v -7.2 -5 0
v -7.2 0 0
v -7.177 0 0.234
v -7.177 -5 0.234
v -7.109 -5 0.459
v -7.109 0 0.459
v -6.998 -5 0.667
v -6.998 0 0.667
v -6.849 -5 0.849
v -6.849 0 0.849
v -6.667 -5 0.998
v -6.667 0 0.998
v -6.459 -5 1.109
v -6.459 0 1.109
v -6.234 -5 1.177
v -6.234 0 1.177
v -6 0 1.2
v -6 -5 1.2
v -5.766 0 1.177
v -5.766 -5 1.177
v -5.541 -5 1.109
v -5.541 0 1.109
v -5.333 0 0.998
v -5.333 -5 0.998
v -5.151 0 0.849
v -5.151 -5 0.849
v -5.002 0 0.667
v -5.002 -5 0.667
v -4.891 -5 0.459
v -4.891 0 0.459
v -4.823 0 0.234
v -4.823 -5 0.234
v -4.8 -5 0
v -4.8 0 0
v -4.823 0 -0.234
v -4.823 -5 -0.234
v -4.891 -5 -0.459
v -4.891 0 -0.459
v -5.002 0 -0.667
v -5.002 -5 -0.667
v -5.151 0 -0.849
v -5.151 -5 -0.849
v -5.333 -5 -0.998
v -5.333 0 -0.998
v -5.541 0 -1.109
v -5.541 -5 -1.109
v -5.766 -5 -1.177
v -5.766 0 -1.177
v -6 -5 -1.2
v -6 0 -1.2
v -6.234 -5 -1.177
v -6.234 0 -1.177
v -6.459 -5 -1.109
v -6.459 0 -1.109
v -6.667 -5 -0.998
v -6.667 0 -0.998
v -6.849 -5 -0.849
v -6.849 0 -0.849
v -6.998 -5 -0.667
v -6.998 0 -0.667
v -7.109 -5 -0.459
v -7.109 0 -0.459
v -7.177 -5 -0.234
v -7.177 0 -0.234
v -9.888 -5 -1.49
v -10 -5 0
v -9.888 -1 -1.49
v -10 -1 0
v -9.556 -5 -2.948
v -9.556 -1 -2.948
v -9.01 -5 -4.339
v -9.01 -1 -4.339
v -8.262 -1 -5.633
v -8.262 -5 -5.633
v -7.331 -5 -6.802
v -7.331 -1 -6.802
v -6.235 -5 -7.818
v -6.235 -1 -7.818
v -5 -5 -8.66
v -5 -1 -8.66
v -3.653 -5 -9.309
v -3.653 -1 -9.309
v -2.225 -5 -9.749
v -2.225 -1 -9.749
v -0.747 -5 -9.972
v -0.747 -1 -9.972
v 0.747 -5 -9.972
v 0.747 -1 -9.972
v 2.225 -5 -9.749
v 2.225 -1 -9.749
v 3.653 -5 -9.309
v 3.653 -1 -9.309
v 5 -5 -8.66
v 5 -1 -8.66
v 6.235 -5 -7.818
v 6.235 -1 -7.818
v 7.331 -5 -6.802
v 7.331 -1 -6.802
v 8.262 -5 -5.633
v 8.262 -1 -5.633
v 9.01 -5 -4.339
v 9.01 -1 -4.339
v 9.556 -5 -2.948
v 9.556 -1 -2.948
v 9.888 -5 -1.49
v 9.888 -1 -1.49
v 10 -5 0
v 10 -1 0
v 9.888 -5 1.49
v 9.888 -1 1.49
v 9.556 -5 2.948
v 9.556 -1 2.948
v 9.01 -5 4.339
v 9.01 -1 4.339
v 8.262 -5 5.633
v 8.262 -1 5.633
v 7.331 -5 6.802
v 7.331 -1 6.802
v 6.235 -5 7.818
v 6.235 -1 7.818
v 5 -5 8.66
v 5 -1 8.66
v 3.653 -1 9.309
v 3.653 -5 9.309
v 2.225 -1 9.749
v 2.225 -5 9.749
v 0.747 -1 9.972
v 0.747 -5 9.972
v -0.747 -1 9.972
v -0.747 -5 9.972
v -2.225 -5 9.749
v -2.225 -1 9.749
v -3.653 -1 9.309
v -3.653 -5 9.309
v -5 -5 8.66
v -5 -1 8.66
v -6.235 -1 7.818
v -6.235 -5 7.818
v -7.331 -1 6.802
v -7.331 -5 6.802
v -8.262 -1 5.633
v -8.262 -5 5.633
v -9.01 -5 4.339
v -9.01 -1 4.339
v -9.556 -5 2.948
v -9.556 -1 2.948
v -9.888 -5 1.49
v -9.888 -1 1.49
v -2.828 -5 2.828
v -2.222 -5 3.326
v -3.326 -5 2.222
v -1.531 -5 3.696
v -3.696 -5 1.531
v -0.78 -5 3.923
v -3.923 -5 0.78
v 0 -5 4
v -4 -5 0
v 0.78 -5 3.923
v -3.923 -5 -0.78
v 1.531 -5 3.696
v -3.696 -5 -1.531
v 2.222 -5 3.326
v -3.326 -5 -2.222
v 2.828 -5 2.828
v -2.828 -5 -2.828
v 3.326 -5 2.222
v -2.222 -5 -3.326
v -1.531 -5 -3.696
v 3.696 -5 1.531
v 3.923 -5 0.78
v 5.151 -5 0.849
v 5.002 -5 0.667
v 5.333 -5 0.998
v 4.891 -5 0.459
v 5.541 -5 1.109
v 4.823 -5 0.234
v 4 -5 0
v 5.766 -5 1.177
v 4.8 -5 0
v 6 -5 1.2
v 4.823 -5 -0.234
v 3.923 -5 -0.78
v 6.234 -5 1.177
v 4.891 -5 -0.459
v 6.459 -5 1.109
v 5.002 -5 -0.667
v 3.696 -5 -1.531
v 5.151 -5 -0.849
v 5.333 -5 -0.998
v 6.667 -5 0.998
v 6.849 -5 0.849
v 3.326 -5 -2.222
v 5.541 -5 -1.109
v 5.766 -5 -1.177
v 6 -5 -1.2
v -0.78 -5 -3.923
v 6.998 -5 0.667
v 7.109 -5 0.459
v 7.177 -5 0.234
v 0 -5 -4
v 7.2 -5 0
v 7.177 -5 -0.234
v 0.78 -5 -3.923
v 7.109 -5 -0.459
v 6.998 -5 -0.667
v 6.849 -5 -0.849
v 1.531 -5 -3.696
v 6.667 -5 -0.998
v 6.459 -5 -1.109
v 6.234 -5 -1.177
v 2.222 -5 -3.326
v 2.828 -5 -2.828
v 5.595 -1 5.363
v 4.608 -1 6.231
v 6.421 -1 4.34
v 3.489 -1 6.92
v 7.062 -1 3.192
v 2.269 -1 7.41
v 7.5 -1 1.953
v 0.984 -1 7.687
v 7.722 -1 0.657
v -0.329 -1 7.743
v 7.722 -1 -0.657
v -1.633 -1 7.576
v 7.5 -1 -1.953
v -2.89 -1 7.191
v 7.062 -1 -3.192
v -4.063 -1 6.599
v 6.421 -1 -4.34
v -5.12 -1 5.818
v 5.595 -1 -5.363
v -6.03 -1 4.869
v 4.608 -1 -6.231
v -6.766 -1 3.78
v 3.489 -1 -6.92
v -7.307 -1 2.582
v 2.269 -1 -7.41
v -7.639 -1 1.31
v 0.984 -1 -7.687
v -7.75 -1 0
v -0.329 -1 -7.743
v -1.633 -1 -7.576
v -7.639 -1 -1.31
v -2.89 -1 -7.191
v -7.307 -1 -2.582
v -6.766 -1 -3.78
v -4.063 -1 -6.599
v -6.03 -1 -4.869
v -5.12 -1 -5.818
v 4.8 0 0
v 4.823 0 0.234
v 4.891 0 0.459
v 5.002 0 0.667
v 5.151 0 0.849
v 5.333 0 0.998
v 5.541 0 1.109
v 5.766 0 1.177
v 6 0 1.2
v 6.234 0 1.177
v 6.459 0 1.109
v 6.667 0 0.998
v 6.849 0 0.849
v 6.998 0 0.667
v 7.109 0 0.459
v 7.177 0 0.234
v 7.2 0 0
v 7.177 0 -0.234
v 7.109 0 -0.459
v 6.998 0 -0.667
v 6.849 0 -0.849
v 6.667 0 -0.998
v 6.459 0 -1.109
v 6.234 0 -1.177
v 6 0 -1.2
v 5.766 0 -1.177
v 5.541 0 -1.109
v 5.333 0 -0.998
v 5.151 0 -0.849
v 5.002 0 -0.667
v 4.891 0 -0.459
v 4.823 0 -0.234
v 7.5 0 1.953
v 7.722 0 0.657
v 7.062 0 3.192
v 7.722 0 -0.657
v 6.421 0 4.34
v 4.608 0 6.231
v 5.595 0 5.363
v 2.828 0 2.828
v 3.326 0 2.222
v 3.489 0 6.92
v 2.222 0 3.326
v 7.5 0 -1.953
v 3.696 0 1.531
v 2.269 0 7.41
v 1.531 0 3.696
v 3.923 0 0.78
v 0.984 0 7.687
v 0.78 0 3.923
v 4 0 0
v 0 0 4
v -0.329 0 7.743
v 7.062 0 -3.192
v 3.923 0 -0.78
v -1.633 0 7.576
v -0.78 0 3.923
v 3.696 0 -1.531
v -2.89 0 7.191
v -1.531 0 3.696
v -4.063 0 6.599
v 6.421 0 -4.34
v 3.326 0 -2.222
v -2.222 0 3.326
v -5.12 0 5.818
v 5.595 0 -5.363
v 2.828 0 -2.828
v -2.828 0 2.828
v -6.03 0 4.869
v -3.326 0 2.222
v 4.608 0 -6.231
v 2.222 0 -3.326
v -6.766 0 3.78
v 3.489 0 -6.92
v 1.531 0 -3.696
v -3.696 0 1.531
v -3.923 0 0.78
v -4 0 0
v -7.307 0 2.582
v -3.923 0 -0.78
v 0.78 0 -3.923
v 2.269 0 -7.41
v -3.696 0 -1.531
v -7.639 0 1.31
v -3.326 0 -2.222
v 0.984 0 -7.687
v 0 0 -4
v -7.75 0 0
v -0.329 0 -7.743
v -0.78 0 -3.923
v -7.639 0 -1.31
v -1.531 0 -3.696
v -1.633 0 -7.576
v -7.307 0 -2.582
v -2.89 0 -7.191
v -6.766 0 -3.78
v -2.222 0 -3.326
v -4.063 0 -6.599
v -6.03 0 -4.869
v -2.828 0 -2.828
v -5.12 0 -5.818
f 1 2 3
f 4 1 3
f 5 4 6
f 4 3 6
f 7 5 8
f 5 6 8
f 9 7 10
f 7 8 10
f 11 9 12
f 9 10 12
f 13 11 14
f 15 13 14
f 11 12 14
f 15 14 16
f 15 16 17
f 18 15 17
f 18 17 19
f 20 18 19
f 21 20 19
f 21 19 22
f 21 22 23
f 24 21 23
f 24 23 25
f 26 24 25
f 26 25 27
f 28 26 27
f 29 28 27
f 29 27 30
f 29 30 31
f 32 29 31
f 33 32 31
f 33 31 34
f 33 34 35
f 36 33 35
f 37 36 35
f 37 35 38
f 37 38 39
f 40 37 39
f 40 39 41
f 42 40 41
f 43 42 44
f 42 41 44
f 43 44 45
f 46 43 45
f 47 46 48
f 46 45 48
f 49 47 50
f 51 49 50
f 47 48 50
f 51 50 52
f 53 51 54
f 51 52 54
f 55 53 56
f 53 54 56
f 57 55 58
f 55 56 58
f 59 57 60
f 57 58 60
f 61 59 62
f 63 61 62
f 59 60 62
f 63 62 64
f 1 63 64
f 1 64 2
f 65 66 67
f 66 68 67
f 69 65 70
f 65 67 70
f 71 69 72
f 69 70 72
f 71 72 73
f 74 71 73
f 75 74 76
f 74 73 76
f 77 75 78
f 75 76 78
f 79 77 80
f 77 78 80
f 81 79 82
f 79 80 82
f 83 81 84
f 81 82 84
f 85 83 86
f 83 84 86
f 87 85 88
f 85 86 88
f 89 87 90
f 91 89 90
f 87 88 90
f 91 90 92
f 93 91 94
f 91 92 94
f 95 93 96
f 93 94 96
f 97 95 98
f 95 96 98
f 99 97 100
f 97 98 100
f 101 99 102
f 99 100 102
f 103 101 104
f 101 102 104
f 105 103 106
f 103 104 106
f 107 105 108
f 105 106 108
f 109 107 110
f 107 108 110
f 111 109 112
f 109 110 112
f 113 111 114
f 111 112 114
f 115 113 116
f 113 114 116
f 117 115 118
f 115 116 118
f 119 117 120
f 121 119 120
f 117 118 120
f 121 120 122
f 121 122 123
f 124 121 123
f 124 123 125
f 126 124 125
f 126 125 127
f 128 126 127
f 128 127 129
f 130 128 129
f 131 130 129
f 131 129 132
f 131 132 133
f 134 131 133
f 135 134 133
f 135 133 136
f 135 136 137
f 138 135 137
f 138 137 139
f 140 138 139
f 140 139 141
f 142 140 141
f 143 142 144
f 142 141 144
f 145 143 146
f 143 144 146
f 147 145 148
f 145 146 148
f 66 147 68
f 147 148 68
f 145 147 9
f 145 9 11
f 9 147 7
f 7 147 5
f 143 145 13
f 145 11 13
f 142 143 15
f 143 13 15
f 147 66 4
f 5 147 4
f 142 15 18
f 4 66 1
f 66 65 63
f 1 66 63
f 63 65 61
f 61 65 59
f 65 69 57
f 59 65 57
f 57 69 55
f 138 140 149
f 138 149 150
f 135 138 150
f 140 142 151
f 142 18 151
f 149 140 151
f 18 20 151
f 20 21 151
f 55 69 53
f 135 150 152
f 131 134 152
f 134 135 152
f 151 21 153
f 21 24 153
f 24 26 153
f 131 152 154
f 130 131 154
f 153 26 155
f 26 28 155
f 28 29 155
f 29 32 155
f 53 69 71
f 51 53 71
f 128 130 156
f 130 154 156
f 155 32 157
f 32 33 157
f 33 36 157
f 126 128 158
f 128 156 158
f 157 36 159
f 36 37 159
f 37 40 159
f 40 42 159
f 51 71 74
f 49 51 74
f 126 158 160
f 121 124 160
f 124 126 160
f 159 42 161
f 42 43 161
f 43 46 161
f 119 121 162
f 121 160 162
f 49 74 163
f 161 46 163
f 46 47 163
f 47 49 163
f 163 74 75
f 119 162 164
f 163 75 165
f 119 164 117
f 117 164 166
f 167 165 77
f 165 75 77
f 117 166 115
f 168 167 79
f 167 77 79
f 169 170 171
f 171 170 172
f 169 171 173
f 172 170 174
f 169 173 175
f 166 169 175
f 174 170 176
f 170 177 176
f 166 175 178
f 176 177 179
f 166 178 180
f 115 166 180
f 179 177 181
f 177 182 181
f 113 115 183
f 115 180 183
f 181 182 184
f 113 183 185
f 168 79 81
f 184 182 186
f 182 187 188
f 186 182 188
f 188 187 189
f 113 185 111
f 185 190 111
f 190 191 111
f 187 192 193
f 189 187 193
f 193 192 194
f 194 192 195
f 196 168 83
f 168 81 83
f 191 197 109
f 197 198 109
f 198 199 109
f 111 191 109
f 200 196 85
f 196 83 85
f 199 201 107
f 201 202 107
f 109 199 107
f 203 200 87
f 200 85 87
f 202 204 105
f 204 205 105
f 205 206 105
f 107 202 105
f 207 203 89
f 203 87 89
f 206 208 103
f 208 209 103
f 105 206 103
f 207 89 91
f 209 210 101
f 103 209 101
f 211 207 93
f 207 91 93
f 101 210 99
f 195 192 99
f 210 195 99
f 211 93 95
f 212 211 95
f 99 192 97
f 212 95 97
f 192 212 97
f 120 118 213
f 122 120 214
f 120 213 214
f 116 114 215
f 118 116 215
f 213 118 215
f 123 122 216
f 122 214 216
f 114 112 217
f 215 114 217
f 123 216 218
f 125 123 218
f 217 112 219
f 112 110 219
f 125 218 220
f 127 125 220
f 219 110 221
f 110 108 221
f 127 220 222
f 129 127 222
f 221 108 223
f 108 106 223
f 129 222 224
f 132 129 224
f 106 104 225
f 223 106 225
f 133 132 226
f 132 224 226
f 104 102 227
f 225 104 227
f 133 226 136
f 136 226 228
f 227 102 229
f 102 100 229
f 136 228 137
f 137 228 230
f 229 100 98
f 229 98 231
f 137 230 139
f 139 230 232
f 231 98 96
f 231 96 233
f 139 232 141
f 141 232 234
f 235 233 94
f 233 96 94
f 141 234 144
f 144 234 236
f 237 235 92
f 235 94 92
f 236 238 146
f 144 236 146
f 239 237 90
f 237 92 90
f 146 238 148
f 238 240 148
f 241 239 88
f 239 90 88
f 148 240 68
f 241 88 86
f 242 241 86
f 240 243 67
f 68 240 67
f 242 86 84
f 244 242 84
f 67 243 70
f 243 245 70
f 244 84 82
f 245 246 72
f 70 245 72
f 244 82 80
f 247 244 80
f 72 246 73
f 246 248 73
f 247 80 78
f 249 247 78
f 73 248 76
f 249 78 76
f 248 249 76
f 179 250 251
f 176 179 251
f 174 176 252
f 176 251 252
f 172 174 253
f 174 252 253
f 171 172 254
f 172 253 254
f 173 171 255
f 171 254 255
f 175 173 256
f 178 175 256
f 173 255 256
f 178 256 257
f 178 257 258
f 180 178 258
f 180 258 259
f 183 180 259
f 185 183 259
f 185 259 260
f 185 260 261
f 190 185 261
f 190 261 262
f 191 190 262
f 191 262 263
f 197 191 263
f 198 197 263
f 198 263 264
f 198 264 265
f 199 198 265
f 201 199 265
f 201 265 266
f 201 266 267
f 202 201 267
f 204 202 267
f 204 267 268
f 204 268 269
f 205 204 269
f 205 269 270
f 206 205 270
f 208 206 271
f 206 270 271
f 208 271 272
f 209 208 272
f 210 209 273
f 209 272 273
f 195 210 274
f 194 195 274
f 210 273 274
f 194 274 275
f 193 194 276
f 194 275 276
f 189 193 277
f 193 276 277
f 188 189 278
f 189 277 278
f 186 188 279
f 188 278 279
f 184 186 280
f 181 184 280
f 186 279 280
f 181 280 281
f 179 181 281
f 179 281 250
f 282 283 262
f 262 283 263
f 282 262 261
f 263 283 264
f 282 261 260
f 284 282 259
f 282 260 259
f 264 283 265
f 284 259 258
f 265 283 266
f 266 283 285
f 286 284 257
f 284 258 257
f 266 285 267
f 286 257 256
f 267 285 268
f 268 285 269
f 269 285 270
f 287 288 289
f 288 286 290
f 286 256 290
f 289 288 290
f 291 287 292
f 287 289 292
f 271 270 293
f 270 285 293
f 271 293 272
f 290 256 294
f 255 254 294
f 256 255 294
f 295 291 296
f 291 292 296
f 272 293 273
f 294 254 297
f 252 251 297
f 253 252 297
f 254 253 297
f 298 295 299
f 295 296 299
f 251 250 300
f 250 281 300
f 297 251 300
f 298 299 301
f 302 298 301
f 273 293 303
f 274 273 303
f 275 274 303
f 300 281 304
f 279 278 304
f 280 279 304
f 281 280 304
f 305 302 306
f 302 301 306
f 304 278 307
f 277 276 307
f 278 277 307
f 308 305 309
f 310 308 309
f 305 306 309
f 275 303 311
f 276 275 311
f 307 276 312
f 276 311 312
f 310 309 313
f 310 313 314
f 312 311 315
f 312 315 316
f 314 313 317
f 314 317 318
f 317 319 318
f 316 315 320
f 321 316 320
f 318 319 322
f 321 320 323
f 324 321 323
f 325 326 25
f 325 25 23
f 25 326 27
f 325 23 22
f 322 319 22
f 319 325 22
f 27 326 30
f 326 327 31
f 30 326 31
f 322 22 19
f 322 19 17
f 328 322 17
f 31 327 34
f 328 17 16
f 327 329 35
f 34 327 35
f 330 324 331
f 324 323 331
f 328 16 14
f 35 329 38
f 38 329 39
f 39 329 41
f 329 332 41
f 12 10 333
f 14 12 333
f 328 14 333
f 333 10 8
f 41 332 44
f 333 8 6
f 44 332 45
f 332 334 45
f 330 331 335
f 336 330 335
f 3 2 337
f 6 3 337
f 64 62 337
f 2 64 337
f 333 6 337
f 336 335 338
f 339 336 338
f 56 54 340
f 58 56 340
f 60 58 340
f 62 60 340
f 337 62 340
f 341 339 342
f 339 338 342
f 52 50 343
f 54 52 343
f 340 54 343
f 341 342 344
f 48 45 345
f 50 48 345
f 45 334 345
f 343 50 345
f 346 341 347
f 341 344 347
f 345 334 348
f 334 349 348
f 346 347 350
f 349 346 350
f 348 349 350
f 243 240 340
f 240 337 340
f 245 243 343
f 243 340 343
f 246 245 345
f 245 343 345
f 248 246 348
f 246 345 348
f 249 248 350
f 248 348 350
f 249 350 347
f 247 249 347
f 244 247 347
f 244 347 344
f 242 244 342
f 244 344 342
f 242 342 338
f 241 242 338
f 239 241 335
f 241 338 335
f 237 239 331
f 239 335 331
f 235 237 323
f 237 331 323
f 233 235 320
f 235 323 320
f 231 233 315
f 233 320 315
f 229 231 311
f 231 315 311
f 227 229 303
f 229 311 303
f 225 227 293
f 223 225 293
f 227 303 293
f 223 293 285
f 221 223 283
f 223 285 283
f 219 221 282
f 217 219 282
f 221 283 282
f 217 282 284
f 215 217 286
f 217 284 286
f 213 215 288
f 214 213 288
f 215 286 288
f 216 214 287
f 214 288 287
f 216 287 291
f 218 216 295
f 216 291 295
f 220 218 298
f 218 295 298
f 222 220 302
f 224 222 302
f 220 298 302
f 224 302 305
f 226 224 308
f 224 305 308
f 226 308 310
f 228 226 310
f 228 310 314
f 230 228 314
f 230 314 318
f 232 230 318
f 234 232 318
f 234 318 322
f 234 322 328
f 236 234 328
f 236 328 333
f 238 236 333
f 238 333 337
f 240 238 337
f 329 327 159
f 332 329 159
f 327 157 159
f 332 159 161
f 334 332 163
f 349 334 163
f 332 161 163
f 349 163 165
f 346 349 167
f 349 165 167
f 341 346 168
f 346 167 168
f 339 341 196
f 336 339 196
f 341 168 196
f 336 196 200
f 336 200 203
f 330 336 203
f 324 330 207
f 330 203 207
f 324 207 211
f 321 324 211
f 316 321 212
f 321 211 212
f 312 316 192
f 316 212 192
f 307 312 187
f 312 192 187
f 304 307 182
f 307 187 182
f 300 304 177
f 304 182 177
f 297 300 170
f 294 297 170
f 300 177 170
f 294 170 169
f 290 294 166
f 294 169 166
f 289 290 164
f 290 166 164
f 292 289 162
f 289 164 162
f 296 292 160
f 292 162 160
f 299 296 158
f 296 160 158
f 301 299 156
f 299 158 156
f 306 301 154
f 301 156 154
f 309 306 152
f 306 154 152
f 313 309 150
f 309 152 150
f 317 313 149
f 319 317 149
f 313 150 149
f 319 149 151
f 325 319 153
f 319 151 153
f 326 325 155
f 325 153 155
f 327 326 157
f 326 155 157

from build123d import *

# Parameters (mm, degrees)
ESQUISSE2_R             = 1.2
ENL_V_MAT_EXTRU_1_DEPTH = 16


with BuildPart() as part:
    # Esquisse1 → Révolution1 (revolve)
    with BuildSketch(Plane.XY, mode=Mode.PRIVATE) as r_volution1_sk:
        Polygon((4, 0), (4, -5), (10, -5), (10, -1), (7.75, -1), (7.75, 0), align=None)
    revolve(r_volution1_sk.sketch.rotate(Axis((0, 0, 0), (0, -1, 0)), 180), axis=Axis((0, 0, 0), (0, -1, 0)))

    # Esquisse2 → Enlèv. mat.-Extru.1 (cut, through all)
    with BuildSketch(Plane(origin=(0, 0, 0), x_dir=(1, 0, 0), z_dir=(0, 1, 0))):
        with Locations(Location((6, 0, 0), (0, 0, 180))):
            Circle(ESQUISSE2_R)
        with Locations(Location((-6, 0, 0), (0, 0, 180))):
            Circle(ESQUISSE2_R)
    extrude(amount=-ENL_V_MAT_EXTRU_1_DEPTH, mode=Mode.SUBTRACT)


solid = part.part
